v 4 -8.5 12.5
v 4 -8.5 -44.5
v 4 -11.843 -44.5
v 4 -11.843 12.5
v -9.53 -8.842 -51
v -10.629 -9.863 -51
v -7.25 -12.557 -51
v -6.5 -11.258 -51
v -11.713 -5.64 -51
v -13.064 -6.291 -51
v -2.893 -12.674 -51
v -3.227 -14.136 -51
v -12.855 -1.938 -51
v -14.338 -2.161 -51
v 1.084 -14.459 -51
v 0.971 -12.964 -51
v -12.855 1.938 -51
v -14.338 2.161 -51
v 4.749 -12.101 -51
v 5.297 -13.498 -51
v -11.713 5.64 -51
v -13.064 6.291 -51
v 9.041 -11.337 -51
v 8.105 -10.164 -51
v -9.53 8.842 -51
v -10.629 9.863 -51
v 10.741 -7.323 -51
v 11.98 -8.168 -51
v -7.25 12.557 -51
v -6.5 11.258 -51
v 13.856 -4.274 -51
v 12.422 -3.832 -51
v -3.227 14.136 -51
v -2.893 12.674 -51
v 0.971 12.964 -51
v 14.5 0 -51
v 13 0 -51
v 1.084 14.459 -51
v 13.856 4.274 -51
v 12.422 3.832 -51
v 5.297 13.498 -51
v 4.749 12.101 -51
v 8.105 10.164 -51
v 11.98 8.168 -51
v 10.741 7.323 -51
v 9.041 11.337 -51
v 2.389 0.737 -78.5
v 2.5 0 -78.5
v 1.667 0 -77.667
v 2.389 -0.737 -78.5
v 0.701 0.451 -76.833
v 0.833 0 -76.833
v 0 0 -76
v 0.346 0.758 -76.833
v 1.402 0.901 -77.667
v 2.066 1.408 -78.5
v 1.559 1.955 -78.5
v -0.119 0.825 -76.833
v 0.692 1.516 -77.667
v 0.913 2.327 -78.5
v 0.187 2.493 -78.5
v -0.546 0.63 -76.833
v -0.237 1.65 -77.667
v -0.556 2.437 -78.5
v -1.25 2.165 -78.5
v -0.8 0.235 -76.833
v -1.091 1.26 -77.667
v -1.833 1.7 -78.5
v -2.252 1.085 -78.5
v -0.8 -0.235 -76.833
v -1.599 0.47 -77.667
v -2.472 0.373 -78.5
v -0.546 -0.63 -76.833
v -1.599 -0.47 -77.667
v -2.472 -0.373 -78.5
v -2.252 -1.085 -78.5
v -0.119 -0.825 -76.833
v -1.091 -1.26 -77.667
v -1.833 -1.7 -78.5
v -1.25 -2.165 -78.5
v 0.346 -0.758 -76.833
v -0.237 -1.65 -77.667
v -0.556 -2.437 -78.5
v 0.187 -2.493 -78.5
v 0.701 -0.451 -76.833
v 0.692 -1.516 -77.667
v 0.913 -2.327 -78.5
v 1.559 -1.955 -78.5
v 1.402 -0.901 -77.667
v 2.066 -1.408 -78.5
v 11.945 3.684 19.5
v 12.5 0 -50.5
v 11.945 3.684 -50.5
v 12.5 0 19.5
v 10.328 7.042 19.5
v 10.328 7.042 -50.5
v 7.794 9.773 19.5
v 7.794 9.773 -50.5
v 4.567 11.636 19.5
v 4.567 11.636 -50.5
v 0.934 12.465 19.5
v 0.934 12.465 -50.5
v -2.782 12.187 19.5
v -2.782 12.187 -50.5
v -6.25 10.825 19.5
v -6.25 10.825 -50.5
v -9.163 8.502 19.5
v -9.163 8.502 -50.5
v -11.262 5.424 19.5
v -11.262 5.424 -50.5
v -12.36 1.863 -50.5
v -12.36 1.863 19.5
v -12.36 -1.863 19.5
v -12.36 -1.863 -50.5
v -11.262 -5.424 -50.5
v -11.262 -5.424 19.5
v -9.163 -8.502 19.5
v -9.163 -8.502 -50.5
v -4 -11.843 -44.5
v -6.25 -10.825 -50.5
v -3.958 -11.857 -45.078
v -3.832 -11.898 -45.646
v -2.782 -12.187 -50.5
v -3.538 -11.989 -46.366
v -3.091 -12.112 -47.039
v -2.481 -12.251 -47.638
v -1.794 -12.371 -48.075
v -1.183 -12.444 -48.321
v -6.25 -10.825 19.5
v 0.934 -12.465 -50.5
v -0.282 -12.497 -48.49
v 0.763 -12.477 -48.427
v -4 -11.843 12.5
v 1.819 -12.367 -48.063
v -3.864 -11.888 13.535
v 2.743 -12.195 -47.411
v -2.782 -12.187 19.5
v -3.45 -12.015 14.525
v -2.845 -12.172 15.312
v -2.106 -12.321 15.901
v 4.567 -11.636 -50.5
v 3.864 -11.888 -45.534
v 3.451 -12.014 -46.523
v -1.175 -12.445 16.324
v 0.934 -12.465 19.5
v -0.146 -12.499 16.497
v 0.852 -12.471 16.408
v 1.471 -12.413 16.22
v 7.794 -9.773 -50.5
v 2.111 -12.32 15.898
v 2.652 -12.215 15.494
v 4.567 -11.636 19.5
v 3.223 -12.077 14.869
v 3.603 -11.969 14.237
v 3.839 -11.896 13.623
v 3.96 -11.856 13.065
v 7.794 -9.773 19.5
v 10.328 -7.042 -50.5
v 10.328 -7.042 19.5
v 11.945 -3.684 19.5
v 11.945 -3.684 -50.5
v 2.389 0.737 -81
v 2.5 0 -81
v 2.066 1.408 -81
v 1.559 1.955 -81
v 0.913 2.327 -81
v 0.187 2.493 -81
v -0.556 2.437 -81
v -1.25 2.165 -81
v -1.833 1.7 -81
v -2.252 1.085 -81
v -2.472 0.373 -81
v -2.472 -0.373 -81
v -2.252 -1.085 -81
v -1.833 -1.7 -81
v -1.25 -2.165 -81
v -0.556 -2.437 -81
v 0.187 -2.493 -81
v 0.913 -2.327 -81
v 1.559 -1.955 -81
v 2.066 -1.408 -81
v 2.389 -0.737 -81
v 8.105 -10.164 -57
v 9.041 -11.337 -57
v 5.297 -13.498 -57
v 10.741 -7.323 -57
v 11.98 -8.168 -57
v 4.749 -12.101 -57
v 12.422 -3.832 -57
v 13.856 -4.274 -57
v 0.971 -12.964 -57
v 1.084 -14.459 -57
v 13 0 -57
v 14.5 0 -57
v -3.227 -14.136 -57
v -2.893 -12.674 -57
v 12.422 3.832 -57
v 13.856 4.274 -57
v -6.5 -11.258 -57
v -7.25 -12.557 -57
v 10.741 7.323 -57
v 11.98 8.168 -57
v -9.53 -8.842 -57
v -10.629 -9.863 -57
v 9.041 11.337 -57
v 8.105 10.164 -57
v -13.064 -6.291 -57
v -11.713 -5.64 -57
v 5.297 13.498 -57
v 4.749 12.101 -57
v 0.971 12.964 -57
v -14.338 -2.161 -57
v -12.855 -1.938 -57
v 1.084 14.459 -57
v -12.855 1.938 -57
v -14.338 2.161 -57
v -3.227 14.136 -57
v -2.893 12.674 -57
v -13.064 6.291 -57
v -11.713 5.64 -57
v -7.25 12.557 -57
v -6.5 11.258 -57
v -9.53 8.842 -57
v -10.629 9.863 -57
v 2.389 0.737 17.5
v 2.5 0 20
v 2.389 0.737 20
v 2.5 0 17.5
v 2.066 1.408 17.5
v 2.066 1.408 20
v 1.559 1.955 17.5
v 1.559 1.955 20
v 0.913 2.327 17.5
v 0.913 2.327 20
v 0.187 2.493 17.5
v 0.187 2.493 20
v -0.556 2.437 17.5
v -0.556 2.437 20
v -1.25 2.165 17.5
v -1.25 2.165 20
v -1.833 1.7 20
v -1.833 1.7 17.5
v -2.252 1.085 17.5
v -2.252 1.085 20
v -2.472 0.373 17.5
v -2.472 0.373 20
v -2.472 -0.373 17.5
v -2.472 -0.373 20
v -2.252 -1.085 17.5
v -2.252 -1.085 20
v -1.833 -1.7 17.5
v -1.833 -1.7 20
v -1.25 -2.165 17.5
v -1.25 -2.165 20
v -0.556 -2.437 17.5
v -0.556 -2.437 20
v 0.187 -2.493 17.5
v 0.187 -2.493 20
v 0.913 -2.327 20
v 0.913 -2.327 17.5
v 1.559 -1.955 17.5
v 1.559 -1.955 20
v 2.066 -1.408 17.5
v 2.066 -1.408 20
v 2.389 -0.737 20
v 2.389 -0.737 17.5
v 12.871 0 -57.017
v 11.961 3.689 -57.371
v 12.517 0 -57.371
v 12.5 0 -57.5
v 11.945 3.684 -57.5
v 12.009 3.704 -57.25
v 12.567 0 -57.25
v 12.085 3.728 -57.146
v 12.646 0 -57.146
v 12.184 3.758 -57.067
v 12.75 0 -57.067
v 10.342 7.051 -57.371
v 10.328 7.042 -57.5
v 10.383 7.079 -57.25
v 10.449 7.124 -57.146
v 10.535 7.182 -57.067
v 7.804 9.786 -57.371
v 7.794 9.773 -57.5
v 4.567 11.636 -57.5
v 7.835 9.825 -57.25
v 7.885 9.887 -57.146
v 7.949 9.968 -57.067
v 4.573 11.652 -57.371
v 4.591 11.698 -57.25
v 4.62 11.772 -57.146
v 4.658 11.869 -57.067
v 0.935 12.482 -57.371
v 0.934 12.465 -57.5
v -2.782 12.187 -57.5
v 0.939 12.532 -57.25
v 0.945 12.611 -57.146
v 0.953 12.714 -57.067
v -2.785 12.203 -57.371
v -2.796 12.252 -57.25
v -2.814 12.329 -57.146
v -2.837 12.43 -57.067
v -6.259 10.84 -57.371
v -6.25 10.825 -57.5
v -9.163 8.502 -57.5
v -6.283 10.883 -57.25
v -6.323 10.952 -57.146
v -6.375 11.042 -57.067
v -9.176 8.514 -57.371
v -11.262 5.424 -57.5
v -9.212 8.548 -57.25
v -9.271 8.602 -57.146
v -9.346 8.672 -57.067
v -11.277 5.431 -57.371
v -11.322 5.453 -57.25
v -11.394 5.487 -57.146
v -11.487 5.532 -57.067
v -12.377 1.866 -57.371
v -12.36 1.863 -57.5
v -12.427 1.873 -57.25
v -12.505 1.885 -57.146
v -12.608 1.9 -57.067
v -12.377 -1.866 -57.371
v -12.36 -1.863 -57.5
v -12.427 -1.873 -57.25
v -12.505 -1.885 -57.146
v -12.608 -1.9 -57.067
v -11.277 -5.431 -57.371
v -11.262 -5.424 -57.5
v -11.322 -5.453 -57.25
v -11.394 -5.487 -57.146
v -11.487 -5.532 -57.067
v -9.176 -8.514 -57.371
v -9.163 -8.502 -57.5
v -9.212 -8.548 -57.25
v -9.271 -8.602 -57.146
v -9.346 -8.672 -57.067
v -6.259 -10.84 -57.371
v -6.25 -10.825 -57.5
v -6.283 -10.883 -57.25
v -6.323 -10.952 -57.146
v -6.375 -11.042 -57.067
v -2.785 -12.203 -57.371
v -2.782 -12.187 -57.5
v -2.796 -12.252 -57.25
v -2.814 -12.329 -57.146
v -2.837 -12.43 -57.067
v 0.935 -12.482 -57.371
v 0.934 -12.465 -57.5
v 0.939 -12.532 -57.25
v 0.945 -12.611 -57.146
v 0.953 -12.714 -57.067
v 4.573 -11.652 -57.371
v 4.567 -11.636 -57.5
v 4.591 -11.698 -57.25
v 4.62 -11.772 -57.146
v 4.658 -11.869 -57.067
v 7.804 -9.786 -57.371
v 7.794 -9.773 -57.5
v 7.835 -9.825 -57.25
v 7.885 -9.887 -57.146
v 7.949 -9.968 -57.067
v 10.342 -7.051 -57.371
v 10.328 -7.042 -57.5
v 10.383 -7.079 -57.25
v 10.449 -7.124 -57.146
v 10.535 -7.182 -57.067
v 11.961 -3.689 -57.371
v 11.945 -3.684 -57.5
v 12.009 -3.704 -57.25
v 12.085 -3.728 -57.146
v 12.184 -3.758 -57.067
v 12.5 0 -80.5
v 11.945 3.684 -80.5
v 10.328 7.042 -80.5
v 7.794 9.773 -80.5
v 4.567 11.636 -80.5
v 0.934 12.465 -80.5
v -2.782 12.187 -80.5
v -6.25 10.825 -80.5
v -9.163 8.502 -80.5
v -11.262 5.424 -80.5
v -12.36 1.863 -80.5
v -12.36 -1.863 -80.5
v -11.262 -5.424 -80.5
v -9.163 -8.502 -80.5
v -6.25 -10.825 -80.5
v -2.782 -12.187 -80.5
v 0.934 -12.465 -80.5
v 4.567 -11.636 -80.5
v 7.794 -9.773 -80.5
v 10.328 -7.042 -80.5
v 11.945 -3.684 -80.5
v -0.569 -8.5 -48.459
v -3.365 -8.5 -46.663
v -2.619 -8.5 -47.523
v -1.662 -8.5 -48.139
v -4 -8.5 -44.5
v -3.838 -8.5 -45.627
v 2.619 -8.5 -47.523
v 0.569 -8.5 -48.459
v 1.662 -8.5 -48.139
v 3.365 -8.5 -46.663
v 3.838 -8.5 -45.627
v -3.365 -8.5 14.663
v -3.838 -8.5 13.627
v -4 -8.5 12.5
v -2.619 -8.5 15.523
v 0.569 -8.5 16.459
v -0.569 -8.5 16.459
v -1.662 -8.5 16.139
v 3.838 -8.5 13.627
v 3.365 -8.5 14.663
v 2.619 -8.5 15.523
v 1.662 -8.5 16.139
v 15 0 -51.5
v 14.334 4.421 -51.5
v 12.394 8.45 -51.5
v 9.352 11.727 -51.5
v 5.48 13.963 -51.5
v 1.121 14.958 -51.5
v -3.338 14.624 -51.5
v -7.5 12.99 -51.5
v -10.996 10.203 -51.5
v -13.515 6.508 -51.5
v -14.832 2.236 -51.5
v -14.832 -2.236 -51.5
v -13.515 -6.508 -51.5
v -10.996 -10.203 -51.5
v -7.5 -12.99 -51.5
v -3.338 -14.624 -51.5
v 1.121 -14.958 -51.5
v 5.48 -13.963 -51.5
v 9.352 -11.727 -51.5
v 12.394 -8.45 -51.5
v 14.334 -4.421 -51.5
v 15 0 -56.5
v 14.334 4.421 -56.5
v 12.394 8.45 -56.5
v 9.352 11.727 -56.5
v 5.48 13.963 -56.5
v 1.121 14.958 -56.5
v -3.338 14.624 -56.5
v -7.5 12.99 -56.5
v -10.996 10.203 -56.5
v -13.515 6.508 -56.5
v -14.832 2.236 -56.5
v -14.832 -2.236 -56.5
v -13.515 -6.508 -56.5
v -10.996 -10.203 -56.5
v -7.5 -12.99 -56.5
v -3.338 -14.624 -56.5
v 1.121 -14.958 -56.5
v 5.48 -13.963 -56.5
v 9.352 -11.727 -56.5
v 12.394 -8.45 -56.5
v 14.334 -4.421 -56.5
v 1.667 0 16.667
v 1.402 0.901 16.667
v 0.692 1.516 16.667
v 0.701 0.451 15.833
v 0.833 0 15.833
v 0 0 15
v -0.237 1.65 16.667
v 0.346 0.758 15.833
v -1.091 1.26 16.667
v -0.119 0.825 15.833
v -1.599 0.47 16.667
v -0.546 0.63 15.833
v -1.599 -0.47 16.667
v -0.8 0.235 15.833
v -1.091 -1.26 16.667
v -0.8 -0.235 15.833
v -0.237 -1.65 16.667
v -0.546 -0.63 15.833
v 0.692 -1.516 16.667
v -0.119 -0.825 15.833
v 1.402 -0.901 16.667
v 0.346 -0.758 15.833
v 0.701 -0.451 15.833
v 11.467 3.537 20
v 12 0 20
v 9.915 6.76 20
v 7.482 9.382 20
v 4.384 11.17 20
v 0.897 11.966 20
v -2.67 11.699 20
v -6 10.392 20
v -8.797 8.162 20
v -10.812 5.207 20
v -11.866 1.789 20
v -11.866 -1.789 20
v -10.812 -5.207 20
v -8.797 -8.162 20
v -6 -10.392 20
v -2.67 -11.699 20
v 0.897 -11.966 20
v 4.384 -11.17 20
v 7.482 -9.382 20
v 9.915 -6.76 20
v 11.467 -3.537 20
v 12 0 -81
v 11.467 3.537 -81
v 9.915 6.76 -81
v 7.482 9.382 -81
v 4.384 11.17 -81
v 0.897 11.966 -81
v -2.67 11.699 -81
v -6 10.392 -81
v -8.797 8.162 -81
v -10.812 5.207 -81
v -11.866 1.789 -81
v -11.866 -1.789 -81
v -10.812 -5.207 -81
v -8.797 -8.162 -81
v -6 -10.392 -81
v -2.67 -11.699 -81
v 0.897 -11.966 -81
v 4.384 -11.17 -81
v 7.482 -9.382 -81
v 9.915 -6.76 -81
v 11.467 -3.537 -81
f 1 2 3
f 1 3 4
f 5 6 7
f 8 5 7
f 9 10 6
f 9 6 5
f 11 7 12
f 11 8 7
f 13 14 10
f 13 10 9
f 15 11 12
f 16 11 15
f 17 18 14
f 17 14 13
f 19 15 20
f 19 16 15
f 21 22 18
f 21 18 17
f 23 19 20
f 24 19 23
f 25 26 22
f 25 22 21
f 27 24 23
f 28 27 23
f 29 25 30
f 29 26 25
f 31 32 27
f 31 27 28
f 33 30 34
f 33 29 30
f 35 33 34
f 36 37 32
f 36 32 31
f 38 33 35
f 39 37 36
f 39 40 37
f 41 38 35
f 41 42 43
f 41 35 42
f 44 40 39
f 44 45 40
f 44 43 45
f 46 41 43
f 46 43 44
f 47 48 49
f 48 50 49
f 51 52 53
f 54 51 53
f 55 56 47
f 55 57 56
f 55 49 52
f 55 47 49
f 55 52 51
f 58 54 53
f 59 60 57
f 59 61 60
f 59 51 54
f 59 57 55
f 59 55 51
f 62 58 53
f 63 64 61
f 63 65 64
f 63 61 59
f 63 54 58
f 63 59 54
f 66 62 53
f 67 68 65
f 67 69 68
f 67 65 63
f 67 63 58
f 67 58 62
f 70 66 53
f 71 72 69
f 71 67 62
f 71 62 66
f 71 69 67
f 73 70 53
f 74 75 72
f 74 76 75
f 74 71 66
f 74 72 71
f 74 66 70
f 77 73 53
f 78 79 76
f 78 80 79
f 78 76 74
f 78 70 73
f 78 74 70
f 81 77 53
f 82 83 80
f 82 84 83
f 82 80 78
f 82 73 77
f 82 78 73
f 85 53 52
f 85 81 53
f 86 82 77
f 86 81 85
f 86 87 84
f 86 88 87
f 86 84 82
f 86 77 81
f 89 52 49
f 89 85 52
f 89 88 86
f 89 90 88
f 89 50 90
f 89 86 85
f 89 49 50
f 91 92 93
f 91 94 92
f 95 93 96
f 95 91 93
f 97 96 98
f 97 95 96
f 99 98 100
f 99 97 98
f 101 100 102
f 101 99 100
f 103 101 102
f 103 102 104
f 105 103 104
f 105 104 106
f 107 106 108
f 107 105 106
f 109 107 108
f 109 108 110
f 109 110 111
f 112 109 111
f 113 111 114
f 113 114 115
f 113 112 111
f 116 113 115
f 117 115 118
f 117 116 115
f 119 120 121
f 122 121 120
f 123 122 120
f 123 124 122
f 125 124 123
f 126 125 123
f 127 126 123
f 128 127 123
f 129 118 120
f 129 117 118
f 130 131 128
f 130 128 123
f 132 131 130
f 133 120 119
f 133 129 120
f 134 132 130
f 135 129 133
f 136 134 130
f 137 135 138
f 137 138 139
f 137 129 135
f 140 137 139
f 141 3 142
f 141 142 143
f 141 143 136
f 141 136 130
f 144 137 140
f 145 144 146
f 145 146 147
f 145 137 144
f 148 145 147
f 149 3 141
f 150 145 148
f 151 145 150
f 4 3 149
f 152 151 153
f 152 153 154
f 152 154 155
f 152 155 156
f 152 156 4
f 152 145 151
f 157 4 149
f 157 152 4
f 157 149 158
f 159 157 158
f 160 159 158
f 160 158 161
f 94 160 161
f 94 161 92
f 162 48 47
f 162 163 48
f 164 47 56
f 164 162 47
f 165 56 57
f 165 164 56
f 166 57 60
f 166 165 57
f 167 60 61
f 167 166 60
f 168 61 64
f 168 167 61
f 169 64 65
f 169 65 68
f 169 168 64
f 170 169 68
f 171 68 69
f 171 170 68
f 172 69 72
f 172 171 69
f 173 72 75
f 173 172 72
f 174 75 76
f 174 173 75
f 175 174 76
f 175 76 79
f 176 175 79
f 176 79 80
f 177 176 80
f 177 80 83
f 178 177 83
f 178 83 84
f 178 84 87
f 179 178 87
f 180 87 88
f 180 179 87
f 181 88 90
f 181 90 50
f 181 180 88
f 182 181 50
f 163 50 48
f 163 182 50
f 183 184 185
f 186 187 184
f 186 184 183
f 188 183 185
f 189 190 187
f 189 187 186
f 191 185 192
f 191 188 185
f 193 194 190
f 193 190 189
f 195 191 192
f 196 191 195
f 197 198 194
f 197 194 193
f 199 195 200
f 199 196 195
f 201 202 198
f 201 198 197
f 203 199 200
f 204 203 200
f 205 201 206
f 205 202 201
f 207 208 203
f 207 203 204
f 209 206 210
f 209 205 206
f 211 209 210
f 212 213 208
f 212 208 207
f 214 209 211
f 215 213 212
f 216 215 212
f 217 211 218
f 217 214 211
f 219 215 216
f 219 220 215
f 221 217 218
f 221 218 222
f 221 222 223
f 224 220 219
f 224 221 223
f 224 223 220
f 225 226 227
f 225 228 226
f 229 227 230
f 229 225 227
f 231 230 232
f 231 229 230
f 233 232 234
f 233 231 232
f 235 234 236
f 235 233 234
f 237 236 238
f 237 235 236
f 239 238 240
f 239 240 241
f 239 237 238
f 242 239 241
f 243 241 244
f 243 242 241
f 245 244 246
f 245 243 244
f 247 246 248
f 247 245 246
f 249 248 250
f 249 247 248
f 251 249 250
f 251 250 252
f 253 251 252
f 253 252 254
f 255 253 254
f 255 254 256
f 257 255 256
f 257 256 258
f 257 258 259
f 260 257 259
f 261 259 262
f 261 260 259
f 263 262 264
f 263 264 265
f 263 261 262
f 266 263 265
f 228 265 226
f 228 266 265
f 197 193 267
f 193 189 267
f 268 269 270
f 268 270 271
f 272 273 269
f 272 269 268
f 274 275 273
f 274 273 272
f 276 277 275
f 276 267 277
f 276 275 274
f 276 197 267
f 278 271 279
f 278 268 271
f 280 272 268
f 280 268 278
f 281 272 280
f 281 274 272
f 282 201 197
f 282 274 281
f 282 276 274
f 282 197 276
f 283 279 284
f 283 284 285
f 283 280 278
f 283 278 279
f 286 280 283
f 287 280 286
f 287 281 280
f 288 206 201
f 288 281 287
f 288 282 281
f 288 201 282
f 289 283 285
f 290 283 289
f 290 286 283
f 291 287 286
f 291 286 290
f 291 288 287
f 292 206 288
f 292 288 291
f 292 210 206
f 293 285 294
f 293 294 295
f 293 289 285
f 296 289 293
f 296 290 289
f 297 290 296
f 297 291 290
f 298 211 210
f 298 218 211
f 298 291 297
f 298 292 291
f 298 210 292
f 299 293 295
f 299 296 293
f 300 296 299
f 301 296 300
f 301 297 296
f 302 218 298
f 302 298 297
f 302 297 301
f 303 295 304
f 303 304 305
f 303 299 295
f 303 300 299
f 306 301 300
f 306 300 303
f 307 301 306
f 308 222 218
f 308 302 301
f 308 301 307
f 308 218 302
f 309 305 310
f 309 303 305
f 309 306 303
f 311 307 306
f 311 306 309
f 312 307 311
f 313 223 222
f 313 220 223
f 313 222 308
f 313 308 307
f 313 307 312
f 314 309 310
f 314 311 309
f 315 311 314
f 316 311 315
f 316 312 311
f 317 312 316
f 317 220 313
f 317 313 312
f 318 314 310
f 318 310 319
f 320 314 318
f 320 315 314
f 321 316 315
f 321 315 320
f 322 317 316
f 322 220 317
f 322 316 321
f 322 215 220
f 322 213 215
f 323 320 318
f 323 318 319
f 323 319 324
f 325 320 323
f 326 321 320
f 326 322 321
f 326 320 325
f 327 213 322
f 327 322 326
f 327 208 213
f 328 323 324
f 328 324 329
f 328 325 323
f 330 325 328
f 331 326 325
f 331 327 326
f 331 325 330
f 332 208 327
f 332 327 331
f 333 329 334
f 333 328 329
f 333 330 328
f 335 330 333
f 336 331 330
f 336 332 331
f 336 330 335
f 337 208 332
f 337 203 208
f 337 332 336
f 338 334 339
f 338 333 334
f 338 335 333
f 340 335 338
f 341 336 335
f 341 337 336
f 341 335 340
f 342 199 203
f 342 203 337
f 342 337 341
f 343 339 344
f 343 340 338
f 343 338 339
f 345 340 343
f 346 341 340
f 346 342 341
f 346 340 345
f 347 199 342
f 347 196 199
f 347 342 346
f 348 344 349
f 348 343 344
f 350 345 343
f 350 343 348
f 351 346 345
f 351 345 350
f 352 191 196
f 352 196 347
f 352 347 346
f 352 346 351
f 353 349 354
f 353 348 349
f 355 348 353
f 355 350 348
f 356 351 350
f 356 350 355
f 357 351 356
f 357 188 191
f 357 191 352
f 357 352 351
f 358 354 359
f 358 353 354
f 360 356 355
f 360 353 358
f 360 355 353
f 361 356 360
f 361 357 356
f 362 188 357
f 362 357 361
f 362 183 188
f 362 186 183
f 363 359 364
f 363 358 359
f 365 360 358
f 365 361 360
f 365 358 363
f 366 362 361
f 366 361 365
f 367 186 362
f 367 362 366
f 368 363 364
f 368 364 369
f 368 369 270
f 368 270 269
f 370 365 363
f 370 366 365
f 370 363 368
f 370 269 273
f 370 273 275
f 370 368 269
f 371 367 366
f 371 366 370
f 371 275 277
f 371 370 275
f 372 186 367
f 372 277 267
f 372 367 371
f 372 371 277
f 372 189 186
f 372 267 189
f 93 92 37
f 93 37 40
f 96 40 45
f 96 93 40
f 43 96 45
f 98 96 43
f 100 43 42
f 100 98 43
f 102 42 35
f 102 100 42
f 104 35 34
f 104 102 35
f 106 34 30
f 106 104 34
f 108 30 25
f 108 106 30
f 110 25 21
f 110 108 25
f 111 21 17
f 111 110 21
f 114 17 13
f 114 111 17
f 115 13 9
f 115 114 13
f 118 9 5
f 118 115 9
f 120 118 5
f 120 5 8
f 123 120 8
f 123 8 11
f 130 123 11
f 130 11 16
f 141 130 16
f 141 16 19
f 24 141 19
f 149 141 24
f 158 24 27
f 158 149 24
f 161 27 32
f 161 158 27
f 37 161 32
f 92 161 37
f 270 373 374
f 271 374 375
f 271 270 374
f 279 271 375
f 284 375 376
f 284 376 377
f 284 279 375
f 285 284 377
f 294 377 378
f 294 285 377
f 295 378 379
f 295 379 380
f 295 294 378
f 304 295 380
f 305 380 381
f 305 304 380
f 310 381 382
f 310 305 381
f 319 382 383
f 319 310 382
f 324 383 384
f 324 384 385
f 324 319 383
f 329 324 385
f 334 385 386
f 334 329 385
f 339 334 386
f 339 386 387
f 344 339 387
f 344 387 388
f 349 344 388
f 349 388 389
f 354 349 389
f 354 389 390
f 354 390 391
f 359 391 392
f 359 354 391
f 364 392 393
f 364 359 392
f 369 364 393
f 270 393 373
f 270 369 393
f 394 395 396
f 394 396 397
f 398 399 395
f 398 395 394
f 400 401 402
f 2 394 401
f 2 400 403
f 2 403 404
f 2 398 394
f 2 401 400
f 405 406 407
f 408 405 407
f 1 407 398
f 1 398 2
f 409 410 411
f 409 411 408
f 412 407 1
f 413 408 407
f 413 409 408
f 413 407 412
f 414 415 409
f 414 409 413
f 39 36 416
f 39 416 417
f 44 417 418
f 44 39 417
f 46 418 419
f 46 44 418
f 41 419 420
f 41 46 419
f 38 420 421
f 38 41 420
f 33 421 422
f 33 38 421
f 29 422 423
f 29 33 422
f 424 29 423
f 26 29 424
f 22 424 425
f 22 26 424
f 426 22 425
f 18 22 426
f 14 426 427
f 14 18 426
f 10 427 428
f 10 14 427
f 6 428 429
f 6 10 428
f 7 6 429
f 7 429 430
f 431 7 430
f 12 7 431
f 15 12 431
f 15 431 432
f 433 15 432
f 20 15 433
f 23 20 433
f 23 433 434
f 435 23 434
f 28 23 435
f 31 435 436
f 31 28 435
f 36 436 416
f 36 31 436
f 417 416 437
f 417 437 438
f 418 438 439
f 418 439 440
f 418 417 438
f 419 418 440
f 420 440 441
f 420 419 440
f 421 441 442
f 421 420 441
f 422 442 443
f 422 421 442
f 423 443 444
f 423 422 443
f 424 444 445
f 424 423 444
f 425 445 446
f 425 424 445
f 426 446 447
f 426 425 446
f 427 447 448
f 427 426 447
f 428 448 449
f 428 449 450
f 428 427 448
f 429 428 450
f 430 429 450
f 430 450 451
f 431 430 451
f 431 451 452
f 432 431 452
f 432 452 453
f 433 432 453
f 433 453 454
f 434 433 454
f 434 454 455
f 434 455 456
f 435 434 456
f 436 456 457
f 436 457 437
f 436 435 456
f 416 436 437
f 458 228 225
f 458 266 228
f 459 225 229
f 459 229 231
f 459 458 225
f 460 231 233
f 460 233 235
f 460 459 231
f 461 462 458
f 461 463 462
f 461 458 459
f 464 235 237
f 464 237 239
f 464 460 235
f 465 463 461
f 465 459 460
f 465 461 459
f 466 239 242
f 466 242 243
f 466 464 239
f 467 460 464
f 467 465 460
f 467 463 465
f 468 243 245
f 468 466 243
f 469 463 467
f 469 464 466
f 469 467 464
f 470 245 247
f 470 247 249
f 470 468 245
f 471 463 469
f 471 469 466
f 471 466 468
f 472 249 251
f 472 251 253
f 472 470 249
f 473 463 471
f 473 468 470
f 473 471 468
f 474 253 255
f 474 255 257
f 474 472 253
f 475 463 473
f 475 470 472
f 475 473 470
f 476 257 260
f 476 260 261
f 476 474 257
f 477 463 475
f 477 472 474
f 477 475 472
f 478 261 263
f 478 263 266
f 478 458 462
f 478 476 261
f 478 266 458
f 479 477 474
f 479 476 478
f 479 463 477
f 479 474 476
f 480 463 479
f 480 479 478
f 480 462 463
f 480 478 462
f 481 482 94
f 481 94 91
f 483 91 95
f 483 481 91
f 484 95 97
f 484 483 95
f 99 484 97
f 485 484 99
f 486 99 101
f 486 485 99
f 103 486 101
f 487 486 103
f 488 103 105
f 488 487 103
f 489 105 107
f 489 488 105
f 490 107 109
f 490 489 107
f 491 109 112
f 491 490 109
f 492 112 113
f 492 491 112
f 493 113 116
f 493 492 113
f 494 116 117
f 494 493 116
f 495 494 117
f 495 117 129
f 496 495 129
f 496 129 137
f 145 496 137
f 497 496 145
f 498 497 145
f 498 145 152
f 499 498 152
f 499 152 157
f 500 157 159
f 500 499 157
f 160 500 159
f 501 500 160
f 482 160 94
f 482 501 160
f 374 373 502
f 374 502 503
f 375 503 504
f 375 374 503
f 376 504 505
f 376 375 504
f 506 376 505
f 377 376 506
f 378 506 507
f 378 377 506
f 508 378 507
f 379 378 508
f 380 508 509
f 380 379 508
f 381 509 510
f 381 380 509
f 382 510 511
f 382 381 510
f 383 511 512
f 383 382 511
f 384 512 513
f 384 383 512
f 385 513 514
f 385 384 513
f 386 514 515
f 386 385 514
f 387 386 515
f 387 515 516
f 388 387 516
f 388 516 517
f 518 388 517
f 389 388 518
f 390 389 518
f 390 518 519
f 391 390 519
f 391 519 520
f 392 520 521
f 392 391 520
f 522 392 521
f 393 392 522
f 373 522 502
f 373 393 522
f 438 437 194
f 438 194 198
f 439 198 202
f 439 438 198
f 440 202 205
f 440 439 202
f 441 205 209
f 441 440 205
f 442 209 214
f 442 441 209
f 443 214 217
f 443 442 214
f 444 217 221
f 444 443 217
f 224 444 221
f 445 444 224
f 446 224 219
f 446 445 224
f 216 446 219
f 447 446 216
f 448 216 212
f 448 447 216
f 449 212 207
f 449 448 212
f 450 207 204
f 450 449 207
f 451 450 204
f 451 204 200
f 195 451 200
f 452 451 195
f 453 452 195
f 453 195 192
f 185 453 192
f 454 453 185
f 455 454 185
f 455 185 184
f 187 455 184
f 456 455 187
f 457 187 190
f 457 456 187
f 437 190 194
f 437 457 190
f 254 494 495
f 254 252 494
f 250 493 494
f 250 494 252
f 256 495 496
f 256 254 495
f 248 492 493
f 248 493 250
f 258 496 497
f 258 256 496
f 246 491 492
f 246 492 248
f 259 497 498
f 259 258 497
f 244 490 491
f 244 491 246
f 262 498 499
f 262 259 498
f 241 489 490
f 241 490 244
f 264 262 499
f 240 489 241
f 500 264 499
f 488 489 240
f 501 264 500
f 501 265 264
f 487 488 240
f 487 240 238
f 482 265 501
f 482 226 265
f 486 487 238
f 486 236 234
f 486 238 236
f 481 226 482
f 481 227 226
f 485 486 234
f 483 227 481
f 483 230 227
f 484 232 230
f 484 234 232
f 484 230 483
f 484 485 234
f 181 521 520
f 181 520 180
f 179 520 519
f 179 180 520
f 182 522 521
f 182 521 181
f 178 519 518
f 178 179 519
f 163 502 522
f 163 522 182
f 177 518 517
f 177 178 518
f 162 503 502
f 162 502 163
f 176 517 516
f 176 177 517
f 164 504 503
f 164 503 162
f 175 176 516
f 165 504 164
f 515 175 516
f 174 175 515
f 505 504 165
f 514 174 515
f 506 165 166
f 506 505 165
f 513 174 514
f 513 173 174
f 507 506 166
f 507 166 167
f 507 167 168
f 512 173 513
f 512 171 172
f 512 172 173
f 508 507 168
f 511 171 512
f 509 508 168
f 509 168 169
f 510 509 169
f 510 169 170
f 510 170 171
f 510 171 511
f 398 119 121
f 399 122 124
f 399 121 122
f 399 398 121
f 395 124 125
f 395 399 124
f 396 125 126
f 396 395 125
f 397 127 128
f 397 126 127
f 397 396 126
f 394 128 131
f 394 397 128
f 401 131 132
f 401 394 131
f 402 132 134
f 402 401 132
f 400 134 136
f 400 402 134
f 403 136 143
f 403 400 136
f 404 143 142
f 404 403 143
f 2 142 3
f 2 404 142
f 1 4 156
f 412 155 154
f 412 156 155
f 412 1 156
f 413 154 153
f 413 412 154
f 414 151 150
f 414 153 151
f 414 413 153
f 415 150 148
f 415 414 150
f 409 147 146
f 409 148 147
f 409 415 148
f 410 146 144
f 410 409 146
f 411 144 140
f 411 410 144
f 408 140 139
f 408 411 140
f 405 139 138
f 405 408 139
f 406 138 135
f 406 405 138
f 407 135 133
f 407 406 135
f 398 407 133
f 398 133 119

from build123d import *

# Parameters (mm, degrees)
F2_SIZE  = 0.5
F3_R     = 0.5
F6_DEPTH = 4


with BuildPart() as f1:
    # F0 (on Front) → F1 (revolve)
    with BuildSketch(Plane.XZ):
        Polygon((0, 15), (0, 0), (0, -76), (2.5, -78.5), (2.5, -81), (12.5, -81), (12.5, -78.3), (12.5, -77), (12.5, -57), (15, -57), (15, -55.7), (15, -51), (12.5, -51), (12.5, 16), (12.5, 17.1), (12.5, 20), (2.5, 20), (2.5, 17.5), align=None)
    revolve(axis=Axis((0, 0, 55.465363), (0, 0, 1)))

    # F2
    f2_edges = [f1.edges().sort_by_distance(p)[0] for p in [
        (-12.5, 0, 20),
        (-15, 0, -51),
        (-12.5, 0, -51),
        (-12.5, 0, -81),
        (-15, 0, -57),
    ]]
    chamfer(f2_edges, length=F2_SIZE)

    # F3
    f3_edges = [f1.edges().sort_by_distance(p)[0] for p in [
        (-12.5, 0, -57),
    ]]
    fillet(f3_edges, radius=F3_R)

    # F5 (on offset) → F6 (cut)
    with BuildSketch(Plane.XZ.offset(8.5)):
        with BuildLine():
            Line((4, -44.5), (4, 12.5))
            ThreePointArc((4, 12.5), (0, 16.5), (-4, 12.5))
            Line((-4, 12.5), (-4, -44.5))
            ThreePointArc((-4, -44.5), (0, -48.5), (4, -44.5))
        make_face()
    extrude(amount=F6_DEPTH, mode=Mode.SUBTRACT)


solid = f1.part
